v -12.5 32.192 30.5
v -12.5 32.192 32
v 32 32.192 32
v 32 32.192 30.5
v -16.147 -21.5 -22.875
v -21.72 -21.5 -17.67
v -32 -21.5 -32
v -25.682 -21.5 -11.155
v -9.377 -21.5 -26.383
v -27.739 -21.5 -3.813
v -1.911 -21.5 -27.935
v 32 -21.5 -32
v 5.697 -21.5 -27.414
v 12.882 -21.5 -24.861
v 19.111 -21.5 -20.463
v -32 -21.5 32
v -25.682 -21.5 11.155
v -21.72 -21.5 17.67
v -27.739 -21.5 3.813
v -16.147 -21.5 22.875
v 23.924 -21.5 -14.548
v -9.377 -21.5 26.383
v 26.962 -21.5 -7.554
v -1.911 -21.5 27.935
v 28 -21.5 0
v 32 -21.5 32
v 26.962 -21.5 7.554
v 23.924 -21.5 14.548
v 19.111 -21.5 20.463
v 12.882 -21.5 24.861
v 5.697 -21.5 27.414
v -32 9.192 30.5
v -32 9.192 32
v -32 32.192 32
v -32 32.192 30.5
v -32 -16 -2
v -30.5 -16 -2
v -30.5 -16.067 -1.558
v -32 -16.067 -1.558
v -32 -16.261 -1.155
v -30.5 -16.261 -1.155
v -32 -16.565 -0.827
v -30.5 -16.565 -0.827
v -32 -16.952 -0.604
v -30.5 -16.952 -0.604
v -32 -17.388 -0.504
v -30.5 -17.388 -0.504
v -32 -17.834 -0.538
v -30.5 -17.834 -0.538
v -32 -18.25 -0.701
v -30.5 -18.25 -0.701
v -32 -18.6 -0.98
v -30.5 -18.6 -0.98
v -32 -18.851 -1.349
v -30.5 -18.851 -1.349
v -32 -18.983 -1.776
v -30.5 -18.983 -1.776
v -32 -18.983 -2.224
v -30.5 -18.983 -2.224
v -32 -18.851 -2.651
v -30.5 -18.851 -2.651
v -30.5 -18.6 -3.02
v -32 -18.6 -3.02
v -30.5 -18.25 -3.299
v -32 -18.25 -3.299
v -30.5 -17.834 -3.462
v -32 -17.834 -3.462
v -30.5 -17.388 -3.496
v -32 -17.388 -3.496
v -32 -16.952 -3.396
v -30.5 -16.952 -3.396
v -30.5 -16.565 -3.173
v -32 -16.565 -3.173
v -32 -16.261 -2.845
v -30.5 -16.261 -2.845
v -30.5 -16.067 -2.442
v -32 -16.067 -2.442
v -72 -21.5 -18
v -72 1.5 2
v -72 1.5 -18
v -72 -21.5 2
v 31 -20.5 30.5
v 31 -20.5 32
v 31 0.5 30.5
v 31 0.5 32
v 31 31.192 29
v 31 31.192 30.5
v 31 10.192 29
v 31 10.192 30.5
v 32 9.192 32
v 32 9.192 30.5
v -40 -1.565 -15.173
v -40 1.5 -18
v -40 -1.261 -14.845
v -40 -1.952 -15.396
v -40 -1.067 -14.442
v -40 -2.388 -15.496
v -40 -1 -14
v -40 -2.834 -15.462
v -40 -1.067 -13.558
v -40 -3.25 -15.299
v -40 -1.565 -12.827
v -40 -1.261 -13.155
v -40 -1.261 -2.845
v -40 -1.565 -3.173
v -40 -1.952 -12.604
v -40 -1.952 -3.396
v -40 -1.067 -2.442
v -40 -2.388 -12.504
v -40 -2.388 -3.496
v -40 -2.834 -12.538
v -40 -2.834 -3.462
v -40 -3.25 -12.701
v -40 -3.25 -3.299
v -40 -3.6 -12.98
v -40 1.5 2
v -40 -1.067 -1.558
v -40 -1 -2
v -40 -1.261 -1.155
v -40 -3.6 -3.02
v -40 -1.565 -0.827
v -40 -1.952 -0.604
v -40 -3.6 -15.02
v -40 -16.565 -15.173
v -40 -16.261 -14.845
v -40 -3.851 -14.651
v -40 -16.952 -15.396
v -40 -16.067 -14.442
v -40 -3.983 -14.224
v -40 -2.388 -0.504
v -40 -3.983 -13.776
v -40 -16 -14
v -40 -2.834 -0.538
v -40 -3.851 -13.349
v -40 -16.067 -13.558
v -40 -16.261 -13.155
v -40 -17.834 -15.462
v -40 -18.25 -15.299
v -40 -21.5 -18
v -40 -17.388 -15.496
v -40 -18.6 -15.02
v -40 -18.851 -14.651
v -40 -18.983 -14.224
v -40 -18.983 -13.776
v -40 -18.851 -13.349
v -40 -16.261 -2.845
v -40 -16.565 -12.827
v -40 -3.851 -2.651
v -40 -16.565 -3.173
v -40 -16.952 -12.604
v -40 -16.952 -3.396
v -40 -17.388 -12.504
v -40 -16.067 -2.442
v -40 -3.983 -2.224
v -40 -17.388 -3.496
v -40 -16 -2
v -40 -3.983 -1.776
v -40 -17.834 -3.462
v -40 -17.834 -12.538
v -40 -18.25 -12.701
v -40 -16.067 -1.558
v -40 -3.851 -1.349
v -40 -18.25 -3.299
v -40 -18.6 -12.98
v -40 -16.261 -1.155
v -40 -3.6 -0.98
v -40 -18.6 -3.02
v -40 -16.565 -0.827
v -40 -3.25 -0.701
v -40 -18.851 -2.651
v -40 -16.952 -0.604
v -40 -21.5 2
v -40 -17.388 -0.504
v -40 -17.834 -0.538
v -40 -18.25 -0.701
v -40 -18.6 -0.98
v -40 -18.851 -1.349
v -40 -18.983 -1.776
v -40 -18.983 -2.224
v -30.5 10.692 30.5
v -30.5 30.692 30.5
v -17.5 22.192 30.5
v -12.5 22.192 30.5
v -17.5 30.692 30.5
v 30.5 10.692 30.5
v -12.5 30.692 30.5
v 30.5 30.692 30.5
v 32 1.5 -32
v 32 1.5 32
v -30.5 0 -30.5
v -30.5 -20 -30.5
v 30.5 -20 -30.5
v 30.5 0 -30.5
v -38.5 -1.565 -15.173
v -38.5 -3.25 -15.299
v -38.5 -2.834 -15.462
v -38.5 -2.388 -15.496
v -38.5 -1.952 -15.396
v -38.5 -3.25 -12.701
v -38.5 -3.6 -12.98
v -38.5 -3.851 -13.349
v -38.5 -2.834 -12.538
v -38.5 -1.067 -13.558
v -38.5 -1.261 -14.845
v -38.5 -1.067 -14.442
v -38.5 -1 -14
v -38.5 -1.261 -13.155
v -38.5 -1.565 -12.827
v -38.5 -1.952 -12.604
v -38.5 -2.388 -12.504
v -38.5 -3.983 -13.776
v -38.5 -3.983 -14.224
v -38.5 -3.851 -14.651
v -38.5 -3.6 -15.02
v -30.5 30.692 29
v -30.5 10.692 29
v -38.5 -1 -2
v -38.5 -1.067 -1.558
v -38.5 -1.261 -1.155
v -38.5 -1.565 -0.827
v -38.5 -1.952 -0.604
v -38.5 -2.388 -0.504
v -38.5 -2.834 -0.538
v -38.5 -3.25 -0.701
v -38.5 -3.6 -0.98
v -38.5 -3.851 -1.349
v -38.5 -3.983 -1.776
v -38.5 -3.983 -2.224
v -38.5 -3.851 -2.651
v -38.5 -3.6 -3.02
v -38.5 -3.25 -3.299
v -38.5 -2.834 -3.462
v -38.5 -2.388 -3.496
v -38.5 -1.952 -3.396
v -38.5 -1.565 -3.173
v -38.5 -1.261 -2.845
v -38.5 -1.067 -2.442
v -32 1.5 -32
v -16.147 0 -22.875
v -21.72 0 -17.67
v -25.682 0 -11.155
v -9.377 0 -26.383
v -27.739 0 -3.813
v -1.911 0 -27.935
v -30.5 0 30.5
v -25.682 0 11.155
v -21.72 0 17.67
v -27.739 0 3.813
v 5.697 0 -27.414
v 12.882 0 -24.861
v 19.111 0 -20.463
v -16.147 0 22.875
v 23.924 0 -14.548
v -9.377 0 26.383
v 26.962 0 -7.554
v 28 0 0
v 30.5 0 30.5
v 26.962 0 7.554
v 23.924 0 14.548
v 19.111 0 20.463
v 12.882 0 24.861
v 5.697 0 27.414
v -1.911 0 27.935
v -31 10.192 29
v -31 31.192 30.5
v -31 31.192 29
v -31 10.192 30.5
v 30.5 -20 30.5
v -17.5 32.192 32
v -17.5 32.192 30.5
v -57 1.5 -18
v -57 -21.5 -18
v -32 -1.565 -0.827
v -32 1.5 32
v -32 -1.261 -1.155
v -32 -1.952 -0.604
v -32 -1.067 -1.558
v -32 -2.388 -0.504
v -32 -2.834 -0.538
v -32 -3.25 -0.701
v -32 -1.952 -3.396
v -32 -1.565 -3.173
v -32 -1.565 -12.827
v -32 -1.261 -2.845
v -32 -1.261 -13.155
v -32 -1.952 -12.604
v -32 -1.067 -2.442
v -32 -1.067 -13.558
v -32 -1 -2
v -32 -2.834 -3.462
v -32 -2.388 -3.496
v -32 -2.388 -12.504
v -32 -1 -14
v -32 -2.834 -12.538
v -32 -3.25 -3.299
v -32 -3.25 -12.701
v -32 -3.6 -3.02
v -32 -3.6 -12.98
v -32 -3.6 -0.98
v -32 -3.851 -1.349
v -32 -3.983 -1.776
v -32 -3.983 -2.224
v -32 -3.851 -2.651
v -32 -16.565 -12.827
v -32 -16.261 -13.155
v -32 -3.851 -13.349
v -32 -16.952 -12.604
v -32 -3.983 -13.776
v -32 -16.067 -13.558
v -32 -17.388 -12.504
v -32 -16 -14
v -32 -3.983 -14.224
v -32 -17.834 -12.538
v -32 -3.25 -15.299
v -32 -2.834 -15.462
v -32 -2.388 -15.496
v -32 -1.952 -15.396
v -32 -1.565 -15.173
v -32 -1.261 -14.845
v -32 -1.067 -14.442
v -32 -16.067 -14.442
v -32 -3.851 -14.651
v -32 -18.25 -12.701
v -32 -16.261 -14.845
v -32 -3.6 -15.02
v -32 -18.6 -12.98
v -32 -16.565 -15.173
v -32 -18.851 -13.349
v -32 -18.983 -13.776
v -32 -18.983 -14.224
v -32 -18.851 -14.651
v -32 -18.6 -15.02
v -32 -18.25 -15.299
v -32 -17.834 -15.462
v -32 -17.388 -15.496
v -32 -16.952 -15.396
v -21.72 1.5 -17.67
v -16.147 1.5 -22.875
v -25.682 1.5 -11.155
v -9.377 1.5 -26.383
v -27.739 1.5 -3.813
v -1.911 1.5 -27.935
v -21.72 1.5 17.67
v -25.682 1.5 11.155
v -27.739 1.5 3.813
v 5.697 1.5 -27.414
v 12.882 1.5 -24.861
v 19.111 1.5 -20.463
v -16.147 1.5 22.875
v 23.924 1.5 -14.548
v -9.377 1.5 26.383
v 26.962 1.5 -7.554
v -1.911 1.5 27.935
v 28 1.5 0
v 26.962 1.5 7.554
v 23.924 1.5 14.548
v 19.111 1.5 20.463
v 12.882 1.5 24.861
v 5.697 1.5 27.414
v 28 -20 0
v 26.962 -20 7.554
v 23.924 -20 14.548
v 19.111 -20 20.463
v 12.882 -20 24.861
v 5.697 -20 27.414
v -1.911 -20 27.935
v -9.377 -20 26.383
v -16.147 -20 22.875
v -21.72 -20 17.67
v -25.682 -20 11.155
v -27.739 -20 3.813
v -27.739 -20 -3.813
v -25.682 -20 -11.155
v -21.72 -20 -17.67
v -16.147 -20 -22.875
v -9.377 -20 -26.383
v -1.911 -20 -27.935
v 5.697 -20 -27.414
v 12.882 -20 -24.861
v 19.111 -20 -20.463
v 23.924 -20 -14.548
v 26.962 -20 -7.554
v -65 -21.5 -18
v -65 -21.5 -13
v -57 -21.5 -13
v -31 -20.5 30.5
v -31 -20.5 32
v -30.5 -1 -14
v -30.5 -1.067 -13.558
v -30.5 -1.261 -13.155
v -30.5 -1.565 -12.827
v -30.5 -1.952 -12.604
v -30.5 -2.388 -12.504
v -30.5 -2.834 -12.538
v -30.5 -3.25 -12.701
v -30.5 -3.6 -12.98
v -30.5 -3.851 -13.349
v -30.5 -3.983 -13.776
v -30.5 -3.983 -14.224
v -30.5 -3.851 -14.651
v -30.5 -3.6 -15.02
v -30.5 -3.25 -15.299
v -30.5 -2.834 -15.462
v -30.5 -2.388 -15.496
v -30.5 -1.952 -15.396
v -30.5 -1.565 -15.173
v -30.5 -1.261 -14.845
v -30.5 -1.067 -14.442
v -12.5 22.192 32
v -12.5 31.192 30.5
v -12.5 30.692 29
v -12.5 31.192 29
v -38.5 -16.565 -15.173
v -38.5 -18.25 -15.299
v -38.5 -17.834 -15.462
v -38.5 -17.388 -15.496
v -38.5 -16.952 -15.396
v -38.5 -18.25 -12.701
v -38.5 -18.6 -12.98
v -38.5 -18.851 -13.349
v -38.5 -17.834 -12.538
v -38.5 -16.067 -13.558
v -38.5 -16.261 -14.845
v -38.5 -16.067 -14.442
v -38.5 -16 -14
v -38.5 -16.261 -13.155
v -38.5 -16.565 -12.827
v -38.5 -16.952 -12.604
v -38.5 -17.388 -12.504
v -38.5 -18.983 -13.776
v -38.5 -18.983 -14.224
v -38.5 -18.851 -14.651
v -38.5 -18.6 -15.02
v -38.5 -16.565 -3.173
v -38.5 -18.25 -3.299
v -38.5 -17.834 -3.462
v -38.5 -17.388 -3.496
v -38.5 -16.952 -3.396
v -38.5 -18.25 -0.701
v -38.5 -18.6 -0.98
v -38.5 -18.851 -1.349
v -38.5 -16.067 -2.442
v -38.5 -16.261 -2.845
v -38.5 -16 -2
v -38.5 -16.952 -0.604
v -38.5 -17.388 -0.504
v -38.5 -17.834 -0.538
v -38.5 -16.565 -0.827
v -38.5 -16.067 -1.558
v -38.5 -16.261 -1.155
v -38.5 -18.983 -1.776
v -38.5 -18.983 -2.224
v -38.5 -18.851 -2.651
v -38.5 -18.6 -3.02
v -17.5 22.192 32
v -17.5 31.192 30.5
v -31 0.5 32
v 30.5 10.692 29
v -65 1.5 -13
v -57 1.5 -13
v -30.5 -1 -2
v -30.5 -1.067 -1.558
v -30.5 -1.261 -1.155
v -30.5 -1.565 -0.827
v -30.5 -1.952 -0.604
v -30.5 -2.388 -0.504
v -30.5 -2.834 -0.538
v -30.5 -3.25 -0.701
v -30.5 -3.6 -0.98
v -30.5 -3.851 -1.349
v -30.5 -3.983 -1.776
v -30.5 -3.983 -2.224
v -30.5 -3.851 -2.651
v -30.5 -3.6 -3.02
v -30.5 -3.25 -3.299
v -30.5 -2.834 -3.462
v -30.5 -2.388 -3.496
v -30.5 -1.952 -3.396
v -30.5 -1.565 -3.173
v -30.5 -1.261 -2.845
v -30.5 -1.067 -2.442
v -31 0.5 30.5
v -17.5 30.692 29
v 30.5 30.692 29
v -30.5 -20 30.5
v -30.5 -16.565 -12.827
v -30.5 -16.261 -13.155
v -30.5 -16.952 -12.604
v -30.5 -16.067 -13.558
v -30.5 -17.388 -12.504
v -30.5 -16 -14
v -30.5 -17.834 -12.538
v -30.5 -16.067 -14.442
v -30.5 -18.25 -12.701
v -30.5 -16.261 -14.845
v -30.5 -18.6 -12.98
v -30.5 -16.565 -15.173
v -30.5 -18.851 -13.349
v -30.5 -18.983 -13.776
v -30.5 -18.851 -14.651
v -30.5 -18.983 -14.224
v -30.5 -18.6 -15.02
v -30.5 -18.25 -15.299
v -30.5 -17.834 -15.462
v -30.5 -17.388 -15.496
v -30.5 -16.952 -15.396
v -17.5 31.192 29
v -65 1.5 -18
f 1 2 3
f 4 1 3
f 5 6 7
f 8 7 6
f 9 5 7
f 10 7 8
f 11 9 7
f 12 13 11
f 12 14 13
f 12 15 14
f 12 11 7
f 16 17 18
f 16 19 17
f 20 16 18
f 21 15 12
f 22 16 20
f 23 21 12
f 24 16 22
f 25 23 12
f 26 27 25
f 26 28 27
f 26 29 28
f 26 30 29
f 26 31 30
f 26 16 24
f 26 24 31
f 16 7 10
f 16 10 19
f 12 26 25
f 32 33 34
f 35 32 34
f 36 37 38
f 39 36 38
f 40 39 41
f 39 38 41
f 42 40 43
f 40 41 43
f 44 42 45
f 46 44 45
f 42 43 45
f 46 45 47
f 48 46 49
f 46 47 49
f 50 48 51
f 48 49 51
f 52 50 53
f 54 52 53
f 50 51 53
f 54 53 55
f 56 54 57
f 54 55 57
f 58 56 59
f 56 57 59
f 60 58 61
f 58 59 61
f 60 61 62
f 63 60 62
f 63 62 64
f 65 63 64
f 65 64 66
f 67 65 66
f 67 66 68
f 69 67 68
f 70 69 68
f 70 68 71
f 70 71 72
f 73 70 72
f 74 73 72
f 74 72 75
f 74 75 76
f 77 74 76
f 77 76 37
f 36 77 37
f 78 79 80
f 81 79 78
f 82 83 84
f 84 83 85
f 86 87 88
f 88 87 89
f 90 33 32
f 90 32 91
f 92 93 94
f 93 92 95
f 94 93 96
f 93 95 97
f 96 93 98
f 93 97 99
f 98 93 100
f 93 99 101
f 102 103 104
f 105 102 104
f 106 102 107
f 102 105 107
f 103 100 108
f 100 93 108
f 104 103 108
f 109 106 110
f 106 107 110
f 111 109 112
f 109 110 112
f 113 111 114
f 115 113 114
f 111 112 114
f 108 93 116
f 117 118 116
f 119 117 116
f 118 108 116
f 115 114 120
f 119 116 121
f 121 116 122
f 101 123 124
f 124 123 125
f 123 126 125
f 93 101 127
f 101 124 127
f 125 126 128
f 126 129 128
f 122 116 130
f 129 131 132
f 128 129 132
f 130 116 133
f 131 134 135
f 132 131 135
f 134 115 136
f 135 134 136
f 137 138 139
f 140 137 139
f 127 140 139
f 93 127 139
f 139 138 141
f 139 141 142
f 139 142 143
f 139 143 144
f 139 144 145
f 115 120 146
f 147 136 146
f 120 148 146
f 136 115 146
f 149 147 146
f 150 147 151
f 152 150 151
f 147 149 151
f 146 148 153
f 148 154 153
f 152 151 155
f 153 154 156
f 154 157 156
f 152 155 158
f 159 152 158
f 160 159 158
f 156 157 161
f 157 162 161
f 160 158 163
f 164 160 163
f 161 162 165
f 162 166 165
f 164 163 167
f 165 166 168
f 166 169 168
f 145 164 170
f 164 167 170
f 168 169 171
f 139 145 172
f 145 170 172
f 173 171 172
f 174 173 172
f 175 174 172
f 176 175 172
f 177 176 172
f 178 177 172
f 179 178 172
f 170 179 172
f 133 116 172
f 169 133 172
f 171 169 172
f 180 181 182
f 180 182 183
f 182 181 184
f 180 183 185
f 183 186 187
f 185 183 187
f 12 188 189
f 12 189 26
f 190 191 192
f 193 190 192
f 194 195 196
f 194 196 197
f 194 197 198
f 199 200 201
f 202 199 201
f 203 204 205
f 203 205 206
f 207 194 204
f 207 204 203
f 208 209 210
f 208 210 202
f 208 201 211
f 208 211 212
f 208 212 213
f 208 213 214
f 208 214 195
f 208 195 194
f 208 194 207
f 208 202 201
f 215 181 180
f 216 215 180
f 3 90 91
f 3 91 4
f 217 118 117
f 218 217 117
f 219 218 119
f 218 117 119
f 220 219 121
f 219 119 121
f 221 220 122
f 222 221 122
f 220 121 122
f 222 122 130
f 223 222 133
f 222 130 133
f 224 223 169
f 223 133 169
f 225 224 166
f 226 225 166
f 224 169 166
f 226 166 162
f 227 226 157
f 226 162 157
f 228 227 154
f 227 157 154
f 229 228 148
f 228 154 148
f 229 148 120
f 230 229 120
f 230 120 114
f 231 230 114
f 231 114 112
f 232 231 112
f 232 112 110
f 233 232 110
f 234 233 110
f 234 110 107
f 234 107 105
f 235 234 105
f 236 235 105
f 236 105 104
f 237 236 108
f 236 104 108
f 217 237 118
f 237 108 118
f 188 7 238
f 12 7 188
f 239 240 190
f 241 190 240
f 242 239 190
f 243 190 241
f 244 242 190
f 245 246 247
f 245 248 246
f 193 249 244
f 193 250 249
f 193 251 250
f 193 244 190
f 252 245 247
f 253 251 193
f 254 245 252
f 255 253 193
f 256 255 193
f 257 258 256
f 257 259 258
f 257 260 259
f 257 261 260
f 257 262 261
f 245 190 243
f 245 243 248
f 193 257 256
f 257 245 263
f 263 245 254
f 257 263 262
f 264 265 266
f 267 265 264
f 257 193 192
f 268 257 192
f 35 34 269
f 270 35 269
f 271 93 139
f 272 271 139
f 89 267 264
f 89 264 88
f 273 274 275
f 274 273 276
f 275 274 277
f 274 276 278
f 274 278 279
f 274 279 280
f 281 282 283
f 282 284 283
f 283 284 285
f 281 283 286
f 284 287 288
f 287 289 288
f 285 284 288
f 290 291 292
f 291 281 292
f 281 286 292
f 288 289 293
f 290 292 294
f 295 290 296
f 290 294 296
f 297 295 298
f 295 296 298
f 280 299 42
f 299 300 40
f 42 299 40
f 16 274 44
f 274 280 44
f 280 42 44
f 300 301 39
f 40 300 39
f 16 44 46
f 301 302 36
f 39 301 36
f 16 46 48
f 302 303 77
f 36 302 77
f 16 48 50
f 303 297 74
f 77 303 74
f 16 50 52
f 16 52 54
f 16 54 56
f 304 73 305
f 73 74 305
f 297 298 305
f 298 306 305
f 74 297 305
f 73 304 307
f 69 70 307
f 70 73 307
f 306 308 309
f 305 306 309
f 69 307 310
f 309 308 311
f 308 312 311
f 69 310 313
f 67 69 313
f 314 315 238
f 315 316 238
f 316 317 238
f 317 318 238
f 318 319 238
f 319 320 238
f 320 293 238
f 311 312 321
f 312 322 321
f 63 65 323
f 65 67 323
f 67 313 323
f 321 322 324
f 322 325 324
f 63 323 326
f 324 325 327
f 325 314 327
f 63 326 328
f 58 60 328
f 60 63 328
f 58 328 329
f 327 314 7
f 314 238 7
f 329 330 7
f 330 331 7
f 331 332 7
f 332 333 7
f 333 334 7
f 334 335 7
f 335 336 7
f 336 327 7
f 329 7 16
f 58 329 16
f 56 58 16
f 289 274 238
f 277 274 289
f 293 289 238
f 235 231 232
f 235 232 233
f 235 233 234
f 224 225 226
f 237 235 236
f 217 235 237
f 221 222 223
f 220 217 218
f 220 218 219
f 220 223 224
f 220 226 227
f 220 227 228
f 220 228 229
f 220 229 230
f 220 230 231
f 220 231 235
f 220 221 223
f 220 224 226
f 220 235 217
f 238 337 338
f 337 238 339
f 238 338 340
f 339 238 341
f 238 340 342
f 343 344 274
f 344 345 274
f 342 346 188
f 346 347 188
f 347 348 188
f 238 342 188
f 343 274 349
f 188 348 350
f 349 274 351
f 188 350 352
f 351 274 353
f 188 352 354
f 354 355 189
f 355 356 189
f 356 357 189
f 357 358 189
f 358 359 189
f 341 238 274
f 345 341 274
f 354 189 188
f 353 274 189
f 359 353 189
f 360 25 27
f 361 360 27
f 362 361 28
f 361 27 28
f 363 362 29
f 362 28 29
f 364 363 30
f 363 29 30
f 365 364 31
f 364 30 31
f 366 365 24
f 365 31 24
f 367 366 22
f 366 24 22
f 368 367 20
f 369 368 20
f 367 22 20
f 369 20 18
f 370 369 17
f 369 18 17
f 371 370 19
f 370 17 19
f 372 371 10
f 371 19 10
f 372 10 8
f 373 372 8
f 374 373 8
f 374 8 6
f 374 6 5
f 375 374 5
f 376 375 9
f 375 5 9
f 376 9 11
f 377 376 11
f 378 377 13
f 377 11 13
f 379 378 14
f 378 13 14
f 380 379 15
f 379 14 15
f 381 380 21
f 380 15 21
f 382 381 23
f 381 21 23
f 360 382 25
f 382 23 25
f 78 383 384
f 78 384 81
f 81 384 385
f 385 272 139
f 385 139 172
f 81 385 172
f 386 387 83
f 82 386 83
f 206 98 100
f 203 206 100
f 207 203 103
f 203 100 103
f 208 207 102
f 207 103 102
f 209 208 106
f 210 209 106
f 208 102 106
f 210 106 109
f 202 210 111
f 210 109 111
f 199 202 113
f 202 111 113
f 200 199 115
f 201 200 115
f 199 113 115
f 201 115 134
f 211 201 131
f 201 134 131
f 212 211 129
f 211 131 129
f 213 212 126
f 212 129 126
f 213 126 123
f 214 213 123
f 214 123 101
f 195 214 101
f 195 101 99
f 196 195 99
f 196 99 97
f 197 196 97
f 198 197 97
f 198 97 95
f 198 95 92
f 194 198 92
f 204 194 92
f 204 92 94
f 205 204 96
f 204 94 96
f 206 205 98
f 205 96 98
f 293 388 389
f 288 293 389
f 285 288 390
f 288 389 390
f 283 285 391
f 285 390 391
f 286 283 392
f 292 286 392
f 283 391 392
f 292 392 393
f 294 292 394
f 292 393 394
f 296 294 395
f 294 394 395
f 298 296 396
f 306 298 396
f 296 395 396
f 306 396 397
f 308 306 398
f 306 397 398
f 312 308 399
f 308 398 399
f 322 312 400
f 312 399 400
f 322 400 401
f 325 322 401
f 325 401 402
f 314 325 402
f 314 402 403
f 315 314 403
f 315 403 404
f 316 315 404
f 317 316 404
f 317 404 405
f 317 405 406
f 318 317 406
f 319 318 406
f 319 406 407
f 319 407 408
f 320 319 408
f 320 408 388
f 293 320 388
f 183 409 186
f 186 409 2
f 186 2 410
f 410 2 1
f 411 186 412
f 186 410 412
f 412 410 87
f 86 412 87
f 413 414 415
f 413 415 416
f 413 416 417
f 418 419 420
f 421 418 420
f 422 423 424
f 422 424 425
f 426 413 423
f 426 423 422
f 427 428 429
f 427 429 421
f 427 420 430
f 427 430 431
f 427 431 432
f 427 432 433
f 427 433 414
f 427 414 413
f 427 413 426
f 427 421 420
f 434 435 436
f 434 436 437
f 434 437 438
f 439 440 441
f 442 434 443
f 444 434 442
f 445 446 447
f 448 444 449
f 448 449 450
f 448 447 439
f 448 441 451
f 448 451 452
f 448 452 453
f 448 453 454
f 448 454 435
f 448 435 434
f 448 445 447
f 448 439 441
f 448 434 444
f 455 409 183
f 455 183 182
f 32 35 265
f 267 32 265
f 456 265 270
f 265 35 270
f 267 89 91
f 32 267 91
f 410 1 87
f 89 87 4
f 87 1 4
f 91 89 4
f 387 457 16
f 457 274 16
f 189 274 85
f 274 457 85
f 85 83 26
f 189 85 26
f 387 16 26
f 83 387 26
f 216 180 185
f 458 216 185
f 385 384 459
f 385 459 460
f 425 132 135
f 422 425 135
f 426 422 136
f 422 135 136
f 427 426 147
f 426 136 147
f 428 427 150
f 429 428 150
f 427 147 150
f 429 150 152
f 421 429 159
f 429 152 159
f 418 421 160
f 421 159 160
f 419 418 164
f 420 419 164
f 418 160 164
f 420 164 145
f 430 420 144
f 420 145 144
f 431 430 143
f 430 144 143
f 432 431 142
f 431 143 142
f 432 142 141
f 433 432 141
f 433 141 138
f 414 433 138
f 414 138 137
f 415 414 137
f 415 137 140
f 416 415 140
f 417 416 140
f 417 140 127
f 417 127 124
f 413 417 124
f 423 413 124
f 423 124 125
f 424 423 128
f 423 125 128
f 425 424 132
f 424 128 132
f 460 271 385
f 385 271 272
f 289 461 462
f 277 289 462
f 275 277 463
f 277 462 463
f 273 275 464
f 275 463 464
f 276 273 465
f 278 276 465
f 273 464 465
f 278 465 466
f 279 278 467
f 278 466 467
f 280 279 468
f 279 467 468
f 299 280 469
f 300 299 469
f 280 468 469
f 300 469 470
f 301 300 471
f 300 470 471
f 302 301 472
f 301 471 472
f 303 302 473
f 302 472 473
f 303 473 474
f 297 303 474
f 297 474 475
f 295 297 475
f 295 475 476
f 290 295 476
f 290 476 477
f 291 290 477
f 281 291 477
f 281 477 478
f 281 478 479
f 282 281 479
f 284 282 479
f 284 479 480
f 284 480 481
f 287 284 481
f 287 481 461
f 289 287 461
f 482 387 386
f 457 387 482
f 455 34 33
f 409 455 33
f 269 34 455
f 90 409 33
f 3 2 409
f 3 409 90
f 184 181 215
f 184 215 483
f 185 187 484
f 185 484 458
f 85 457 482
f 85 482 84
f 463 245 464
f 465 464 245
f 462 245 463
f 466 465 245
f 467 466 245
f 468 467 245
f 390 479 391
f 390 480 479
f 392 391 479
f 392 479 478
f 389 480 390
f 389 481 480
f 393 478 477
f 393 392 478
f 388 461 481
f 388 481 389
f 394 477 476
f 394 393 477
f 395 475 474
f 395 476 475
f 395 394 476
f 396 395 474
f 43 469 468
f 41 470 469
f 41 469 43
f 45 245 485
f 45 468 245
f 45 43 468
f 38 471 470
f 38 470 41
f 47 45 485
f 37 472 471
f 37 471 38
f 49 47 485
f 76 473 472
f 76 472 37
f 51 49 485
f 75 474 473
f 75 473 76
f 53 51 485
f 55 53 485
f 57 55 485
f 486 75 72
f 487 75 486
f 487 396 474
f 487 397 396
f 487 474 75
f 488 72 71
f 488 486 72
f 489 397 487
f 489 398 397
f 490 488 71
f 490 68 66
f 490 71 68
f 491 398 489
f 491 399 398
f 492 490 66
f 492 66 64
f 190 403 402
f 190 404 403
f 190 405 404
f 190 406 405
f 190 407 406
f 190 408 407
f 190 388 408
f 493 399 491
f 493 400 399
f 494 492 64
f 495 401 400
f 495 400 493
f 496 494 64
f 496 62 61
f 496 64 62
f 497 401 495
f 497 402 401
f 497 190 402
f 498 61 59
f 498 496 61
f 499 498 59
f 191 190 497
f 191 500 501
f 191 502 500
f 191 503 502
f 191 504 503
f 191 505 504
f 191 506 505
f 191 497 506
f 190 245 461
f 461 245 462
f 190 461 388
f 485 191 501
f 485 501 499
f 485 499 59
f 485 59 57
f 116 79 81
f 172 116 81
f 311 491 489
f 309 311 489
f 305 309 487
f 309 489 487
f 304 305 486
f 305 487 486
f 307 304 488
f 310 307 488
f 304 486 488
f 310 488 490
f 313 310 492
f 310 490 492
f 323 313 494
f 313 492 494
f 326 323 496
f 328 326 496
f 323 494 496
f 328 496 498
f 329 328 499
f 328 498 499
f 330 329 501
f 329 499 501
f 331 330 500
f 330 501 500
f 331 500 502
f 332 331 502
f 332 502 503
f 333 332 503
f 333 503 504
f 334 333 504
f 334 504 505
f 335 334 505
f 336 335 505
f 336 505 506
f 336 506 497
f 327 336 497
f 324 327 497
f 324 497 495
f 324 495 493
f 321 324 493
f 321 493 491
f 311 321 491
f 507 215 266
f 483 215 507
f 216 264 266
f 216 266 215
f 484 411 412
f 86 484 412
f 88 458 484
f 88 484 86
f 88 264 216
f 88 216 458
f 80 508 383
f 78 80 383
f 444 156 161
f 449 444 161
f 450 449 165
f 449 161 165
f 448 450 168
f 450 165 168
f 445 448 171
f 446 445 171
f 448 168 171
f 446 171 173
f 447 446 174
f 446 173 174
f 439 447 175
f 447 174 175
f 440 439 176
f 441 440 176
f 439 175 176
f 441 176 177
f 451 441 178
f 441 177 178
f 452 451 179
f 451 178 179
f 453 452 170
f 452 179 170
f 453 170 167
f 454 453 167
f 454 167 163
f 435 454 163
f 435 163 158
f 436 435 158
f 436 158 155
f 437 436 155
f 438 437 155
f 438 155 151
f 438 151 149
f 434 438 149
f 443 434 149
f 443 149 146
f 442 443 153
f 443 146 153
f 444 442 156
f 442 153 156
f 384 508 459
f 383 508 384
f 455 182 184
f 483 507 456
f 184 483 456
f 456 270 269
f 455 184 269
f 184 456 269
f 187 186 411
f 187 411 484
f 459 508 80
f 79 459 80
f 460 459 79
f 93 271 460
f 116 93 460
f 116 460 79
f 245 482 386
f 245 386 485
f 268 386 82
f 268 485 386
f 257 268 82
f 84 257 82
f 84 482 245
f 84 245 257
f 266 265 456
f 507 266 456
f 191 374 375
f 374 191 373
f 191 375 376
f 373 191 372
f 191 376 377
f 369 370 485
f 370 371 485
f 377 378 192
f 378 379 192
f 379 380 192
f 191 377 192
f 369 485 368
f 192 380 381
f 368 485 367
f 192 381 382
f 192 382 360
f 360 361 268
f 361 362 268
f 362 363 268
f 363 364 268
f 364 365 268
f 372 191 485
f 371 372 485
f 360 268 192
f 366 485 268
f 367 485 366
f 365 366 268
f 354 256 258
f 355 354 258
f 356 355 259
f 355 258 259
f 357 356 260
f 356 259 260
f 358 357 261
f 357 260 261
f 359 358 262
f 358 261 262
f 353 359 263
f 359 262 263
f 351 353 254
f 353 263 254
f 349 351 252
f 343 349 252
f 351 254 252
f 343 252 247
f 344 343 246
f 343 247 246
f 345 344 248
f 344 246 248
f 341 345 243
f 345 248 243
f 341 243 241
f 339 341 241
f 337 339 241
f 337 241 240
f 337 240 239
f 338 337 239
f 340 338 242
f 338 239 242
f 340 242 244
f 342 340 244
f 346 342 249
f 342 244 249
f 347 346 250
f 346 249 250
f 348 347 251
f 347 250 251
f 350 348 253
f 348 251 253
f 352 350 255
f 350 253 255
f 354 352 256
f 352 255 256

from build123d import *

# Parameters (mm, degrees)
F0_W      = 64
F0_H      = 64
F0_R      = 28
F1_DEPTH  = 1.5
F2_W      = 64
F2_H      = 21.5
F3_DEPTH  = 1.5
F4_W      = 1.5
F4_H      = 23
F5_DEPTH  = 64
F6_W      = 61
F6_H      = 62.5
F6_R      = 28
F7_DEPTH  = 1.5
F8_W      = 64
F8_H      = 23
F9_DEPTH  = 1.5
F10_W     = 62
F10_H     = 21
F10_W_2   = 61
F10_H_2   = 20
F11_DEPTH = 1.5
F12_W     = 62
F12_H     = 21
F12_W_2   = 61
F12_H_2   = 20
F13_DEPTH = 1.5
F14_W     = 5
F14_H     = 1.5
F15_DEPTH = 10
F17_W     = 23
F17_H     = 20
F18_DEPTH = 32
F19_W     = 8
F19_H     = 23
F20_DEPTH = 5
F21_R     = 1.5
F22_DEPTH = 1.5
F23_R     = 1.5
F24_DEPTH = 4


with BuildPart() as f1:
    # F0 (on Front) → F1 (new body)
    with BuildSketch(Plane.XZ):
        Rectangle(F0_W, F0_H)
        Circle(F0_R, mode=Mode.SUBTRACT)
    extrude(amount=-F1_DEPTH)

    # F2 (on face) → F3 (join)
    with BuildSketch(Plane(origin=(0, 0, -32), x_dir=(1, 0, 0), z_dir=(0, 0, -1))):
        with Locations((0, 10.75)):
            Rectangle(F2_W, F2_H)
    extrude(amount=-F3_DEPTH)

    # F4 (on face) → F5 (join)
    with BuildSketch(Plane(origin=(0, 0, -32), x_dir=(1, 0, 0), z_dir=(0, 0, -1))):
        with Locations((-31.25, 10)):
            Rectangle(F4_W, F4_H)
        with Locations((31.25, 10)):
            Rectangle(F4_W, F4_H)
    extrude(amount=-F5_DEPTH)

    # F6 (on face) → F7 (join)
    with BuildSketch(Plane.XZ.offset(21.5)):
        with Locations((0, 0.75)):
            Rectangle(F6_W, F6_H)
        Circle(F6_R, mode=Mode.SUBTRACT)
    extrude(amount=-F7_DEPTH)

    # F12 (on face) → F13 (cut)
    with BuildSketch(Plane.XY.offset(32)):
        with Locations((0, -10)):
            Rectangle(F12_W, F12_H)
        with Locations((0, -10)):
            Rectangle(F12_W_2, F12_H_2, mode=Mode.SUBTRACT)
    extrude(amount=-F13_DEPTH, mode=Mode.SUBTRACT)

    # F23 (on face) → F24 (cut)
    with BuildSketch(Plane.YZ.offset(-30.5)):
        with Locations((-2.5, -2)):
            Circle(F23_R)
        with Locations((-2.5, -14)):
            Circle(F23_R)
        with Locations((-17.5, -14)):
            Circle(F23_R)
        with Locations((-17.5, -2)):
            Circle(F23_R)
    extrude(amount=-F24_DEPTH, mode=Mode.SUBTRACT)


with BuildPart() as f9:
    # F8 (on face) → F9 (new body)
    with BuildSketch(Plane.XY.offset(32)):
        with Locations((0, 20.6916090101)):
            Rectangle(F8_W, F8_H)
    extrude(amount=-F9_DEPTH)

    # F10 (on face) → F11 (join)
    with BuildSketch(Plane(origin=(0, 0, 30.5), x_dir=(1, 0, 0), z_dir=(0, 0, -1))):
        with Locations((0, -20.6916090101)):
            Rectangle(F10_W, F10_H)
        with Locations((0, -20.6916090101)):
            Rectangle(F10_W_2, F10_H_2, mode=Mode.SUBTRACT)
    extrude(amount=F11_DEPTH)

    # F14 (on face) → F15 (cut)
    with BuildSketch(Plane(origin=(0, 32.1916090101, 0), x_dir=(-1, 0, 0), z_dir=(0, 1, 0))):
        Polygon((17.5, 32), (12.5, 32), (12.5, 30.5060082078), (12.5, 30.5), (17.5, 30.5), (17.5, 30.5060082078), align=None)
        with Locations((15, 29.75)):
            Rectangle(F14_W, F14_H)
    extrude(amount=-F15_DEPTH, mode=Mode.SUBTRACT)


with BuildPart() as f18:
    # F17 (on offset) → F18 (new body)
    with BuildSketch(Plane(origin=(-40, 0, 0), x_dir=(0, -1, 0), z_dir=(-1, 0, 0))):
        with Locations((10, -8)):
            Rectangle(F17_W, F17_H)
    extrude(amount=F18_DEPTH)

    # F19 (on face) → F20 (cut)
    with BuildSketch(Plane(origin=(0, 0, -18), x_dir=(1, 0, 0), z_dir=(0, 0, -1))):
        with Locations((-61, 10)):
            Rectangle(F19_W, F19_H)
    extrude(amount=-F20_DEPTH, mode=Mode.SUBTRACT)

    # F21 (on face) → F22 (join)
    with BuildSketch(Plane.YZ.offset(-40)):
        with Locations((-17.5, -2)):
            Circle(F21_R)
        with Locations((-17.5, -14)):
            Circle(F21_R)
        with Locations((-2.5, -2)):
            Circle(F21_R)
        with Locations((-2.5, -14)):
            Circle(F21_R)
    extrude(amount=F22_DEPTH)


solid = Compound([f1.part, f9.part, f18.part])
